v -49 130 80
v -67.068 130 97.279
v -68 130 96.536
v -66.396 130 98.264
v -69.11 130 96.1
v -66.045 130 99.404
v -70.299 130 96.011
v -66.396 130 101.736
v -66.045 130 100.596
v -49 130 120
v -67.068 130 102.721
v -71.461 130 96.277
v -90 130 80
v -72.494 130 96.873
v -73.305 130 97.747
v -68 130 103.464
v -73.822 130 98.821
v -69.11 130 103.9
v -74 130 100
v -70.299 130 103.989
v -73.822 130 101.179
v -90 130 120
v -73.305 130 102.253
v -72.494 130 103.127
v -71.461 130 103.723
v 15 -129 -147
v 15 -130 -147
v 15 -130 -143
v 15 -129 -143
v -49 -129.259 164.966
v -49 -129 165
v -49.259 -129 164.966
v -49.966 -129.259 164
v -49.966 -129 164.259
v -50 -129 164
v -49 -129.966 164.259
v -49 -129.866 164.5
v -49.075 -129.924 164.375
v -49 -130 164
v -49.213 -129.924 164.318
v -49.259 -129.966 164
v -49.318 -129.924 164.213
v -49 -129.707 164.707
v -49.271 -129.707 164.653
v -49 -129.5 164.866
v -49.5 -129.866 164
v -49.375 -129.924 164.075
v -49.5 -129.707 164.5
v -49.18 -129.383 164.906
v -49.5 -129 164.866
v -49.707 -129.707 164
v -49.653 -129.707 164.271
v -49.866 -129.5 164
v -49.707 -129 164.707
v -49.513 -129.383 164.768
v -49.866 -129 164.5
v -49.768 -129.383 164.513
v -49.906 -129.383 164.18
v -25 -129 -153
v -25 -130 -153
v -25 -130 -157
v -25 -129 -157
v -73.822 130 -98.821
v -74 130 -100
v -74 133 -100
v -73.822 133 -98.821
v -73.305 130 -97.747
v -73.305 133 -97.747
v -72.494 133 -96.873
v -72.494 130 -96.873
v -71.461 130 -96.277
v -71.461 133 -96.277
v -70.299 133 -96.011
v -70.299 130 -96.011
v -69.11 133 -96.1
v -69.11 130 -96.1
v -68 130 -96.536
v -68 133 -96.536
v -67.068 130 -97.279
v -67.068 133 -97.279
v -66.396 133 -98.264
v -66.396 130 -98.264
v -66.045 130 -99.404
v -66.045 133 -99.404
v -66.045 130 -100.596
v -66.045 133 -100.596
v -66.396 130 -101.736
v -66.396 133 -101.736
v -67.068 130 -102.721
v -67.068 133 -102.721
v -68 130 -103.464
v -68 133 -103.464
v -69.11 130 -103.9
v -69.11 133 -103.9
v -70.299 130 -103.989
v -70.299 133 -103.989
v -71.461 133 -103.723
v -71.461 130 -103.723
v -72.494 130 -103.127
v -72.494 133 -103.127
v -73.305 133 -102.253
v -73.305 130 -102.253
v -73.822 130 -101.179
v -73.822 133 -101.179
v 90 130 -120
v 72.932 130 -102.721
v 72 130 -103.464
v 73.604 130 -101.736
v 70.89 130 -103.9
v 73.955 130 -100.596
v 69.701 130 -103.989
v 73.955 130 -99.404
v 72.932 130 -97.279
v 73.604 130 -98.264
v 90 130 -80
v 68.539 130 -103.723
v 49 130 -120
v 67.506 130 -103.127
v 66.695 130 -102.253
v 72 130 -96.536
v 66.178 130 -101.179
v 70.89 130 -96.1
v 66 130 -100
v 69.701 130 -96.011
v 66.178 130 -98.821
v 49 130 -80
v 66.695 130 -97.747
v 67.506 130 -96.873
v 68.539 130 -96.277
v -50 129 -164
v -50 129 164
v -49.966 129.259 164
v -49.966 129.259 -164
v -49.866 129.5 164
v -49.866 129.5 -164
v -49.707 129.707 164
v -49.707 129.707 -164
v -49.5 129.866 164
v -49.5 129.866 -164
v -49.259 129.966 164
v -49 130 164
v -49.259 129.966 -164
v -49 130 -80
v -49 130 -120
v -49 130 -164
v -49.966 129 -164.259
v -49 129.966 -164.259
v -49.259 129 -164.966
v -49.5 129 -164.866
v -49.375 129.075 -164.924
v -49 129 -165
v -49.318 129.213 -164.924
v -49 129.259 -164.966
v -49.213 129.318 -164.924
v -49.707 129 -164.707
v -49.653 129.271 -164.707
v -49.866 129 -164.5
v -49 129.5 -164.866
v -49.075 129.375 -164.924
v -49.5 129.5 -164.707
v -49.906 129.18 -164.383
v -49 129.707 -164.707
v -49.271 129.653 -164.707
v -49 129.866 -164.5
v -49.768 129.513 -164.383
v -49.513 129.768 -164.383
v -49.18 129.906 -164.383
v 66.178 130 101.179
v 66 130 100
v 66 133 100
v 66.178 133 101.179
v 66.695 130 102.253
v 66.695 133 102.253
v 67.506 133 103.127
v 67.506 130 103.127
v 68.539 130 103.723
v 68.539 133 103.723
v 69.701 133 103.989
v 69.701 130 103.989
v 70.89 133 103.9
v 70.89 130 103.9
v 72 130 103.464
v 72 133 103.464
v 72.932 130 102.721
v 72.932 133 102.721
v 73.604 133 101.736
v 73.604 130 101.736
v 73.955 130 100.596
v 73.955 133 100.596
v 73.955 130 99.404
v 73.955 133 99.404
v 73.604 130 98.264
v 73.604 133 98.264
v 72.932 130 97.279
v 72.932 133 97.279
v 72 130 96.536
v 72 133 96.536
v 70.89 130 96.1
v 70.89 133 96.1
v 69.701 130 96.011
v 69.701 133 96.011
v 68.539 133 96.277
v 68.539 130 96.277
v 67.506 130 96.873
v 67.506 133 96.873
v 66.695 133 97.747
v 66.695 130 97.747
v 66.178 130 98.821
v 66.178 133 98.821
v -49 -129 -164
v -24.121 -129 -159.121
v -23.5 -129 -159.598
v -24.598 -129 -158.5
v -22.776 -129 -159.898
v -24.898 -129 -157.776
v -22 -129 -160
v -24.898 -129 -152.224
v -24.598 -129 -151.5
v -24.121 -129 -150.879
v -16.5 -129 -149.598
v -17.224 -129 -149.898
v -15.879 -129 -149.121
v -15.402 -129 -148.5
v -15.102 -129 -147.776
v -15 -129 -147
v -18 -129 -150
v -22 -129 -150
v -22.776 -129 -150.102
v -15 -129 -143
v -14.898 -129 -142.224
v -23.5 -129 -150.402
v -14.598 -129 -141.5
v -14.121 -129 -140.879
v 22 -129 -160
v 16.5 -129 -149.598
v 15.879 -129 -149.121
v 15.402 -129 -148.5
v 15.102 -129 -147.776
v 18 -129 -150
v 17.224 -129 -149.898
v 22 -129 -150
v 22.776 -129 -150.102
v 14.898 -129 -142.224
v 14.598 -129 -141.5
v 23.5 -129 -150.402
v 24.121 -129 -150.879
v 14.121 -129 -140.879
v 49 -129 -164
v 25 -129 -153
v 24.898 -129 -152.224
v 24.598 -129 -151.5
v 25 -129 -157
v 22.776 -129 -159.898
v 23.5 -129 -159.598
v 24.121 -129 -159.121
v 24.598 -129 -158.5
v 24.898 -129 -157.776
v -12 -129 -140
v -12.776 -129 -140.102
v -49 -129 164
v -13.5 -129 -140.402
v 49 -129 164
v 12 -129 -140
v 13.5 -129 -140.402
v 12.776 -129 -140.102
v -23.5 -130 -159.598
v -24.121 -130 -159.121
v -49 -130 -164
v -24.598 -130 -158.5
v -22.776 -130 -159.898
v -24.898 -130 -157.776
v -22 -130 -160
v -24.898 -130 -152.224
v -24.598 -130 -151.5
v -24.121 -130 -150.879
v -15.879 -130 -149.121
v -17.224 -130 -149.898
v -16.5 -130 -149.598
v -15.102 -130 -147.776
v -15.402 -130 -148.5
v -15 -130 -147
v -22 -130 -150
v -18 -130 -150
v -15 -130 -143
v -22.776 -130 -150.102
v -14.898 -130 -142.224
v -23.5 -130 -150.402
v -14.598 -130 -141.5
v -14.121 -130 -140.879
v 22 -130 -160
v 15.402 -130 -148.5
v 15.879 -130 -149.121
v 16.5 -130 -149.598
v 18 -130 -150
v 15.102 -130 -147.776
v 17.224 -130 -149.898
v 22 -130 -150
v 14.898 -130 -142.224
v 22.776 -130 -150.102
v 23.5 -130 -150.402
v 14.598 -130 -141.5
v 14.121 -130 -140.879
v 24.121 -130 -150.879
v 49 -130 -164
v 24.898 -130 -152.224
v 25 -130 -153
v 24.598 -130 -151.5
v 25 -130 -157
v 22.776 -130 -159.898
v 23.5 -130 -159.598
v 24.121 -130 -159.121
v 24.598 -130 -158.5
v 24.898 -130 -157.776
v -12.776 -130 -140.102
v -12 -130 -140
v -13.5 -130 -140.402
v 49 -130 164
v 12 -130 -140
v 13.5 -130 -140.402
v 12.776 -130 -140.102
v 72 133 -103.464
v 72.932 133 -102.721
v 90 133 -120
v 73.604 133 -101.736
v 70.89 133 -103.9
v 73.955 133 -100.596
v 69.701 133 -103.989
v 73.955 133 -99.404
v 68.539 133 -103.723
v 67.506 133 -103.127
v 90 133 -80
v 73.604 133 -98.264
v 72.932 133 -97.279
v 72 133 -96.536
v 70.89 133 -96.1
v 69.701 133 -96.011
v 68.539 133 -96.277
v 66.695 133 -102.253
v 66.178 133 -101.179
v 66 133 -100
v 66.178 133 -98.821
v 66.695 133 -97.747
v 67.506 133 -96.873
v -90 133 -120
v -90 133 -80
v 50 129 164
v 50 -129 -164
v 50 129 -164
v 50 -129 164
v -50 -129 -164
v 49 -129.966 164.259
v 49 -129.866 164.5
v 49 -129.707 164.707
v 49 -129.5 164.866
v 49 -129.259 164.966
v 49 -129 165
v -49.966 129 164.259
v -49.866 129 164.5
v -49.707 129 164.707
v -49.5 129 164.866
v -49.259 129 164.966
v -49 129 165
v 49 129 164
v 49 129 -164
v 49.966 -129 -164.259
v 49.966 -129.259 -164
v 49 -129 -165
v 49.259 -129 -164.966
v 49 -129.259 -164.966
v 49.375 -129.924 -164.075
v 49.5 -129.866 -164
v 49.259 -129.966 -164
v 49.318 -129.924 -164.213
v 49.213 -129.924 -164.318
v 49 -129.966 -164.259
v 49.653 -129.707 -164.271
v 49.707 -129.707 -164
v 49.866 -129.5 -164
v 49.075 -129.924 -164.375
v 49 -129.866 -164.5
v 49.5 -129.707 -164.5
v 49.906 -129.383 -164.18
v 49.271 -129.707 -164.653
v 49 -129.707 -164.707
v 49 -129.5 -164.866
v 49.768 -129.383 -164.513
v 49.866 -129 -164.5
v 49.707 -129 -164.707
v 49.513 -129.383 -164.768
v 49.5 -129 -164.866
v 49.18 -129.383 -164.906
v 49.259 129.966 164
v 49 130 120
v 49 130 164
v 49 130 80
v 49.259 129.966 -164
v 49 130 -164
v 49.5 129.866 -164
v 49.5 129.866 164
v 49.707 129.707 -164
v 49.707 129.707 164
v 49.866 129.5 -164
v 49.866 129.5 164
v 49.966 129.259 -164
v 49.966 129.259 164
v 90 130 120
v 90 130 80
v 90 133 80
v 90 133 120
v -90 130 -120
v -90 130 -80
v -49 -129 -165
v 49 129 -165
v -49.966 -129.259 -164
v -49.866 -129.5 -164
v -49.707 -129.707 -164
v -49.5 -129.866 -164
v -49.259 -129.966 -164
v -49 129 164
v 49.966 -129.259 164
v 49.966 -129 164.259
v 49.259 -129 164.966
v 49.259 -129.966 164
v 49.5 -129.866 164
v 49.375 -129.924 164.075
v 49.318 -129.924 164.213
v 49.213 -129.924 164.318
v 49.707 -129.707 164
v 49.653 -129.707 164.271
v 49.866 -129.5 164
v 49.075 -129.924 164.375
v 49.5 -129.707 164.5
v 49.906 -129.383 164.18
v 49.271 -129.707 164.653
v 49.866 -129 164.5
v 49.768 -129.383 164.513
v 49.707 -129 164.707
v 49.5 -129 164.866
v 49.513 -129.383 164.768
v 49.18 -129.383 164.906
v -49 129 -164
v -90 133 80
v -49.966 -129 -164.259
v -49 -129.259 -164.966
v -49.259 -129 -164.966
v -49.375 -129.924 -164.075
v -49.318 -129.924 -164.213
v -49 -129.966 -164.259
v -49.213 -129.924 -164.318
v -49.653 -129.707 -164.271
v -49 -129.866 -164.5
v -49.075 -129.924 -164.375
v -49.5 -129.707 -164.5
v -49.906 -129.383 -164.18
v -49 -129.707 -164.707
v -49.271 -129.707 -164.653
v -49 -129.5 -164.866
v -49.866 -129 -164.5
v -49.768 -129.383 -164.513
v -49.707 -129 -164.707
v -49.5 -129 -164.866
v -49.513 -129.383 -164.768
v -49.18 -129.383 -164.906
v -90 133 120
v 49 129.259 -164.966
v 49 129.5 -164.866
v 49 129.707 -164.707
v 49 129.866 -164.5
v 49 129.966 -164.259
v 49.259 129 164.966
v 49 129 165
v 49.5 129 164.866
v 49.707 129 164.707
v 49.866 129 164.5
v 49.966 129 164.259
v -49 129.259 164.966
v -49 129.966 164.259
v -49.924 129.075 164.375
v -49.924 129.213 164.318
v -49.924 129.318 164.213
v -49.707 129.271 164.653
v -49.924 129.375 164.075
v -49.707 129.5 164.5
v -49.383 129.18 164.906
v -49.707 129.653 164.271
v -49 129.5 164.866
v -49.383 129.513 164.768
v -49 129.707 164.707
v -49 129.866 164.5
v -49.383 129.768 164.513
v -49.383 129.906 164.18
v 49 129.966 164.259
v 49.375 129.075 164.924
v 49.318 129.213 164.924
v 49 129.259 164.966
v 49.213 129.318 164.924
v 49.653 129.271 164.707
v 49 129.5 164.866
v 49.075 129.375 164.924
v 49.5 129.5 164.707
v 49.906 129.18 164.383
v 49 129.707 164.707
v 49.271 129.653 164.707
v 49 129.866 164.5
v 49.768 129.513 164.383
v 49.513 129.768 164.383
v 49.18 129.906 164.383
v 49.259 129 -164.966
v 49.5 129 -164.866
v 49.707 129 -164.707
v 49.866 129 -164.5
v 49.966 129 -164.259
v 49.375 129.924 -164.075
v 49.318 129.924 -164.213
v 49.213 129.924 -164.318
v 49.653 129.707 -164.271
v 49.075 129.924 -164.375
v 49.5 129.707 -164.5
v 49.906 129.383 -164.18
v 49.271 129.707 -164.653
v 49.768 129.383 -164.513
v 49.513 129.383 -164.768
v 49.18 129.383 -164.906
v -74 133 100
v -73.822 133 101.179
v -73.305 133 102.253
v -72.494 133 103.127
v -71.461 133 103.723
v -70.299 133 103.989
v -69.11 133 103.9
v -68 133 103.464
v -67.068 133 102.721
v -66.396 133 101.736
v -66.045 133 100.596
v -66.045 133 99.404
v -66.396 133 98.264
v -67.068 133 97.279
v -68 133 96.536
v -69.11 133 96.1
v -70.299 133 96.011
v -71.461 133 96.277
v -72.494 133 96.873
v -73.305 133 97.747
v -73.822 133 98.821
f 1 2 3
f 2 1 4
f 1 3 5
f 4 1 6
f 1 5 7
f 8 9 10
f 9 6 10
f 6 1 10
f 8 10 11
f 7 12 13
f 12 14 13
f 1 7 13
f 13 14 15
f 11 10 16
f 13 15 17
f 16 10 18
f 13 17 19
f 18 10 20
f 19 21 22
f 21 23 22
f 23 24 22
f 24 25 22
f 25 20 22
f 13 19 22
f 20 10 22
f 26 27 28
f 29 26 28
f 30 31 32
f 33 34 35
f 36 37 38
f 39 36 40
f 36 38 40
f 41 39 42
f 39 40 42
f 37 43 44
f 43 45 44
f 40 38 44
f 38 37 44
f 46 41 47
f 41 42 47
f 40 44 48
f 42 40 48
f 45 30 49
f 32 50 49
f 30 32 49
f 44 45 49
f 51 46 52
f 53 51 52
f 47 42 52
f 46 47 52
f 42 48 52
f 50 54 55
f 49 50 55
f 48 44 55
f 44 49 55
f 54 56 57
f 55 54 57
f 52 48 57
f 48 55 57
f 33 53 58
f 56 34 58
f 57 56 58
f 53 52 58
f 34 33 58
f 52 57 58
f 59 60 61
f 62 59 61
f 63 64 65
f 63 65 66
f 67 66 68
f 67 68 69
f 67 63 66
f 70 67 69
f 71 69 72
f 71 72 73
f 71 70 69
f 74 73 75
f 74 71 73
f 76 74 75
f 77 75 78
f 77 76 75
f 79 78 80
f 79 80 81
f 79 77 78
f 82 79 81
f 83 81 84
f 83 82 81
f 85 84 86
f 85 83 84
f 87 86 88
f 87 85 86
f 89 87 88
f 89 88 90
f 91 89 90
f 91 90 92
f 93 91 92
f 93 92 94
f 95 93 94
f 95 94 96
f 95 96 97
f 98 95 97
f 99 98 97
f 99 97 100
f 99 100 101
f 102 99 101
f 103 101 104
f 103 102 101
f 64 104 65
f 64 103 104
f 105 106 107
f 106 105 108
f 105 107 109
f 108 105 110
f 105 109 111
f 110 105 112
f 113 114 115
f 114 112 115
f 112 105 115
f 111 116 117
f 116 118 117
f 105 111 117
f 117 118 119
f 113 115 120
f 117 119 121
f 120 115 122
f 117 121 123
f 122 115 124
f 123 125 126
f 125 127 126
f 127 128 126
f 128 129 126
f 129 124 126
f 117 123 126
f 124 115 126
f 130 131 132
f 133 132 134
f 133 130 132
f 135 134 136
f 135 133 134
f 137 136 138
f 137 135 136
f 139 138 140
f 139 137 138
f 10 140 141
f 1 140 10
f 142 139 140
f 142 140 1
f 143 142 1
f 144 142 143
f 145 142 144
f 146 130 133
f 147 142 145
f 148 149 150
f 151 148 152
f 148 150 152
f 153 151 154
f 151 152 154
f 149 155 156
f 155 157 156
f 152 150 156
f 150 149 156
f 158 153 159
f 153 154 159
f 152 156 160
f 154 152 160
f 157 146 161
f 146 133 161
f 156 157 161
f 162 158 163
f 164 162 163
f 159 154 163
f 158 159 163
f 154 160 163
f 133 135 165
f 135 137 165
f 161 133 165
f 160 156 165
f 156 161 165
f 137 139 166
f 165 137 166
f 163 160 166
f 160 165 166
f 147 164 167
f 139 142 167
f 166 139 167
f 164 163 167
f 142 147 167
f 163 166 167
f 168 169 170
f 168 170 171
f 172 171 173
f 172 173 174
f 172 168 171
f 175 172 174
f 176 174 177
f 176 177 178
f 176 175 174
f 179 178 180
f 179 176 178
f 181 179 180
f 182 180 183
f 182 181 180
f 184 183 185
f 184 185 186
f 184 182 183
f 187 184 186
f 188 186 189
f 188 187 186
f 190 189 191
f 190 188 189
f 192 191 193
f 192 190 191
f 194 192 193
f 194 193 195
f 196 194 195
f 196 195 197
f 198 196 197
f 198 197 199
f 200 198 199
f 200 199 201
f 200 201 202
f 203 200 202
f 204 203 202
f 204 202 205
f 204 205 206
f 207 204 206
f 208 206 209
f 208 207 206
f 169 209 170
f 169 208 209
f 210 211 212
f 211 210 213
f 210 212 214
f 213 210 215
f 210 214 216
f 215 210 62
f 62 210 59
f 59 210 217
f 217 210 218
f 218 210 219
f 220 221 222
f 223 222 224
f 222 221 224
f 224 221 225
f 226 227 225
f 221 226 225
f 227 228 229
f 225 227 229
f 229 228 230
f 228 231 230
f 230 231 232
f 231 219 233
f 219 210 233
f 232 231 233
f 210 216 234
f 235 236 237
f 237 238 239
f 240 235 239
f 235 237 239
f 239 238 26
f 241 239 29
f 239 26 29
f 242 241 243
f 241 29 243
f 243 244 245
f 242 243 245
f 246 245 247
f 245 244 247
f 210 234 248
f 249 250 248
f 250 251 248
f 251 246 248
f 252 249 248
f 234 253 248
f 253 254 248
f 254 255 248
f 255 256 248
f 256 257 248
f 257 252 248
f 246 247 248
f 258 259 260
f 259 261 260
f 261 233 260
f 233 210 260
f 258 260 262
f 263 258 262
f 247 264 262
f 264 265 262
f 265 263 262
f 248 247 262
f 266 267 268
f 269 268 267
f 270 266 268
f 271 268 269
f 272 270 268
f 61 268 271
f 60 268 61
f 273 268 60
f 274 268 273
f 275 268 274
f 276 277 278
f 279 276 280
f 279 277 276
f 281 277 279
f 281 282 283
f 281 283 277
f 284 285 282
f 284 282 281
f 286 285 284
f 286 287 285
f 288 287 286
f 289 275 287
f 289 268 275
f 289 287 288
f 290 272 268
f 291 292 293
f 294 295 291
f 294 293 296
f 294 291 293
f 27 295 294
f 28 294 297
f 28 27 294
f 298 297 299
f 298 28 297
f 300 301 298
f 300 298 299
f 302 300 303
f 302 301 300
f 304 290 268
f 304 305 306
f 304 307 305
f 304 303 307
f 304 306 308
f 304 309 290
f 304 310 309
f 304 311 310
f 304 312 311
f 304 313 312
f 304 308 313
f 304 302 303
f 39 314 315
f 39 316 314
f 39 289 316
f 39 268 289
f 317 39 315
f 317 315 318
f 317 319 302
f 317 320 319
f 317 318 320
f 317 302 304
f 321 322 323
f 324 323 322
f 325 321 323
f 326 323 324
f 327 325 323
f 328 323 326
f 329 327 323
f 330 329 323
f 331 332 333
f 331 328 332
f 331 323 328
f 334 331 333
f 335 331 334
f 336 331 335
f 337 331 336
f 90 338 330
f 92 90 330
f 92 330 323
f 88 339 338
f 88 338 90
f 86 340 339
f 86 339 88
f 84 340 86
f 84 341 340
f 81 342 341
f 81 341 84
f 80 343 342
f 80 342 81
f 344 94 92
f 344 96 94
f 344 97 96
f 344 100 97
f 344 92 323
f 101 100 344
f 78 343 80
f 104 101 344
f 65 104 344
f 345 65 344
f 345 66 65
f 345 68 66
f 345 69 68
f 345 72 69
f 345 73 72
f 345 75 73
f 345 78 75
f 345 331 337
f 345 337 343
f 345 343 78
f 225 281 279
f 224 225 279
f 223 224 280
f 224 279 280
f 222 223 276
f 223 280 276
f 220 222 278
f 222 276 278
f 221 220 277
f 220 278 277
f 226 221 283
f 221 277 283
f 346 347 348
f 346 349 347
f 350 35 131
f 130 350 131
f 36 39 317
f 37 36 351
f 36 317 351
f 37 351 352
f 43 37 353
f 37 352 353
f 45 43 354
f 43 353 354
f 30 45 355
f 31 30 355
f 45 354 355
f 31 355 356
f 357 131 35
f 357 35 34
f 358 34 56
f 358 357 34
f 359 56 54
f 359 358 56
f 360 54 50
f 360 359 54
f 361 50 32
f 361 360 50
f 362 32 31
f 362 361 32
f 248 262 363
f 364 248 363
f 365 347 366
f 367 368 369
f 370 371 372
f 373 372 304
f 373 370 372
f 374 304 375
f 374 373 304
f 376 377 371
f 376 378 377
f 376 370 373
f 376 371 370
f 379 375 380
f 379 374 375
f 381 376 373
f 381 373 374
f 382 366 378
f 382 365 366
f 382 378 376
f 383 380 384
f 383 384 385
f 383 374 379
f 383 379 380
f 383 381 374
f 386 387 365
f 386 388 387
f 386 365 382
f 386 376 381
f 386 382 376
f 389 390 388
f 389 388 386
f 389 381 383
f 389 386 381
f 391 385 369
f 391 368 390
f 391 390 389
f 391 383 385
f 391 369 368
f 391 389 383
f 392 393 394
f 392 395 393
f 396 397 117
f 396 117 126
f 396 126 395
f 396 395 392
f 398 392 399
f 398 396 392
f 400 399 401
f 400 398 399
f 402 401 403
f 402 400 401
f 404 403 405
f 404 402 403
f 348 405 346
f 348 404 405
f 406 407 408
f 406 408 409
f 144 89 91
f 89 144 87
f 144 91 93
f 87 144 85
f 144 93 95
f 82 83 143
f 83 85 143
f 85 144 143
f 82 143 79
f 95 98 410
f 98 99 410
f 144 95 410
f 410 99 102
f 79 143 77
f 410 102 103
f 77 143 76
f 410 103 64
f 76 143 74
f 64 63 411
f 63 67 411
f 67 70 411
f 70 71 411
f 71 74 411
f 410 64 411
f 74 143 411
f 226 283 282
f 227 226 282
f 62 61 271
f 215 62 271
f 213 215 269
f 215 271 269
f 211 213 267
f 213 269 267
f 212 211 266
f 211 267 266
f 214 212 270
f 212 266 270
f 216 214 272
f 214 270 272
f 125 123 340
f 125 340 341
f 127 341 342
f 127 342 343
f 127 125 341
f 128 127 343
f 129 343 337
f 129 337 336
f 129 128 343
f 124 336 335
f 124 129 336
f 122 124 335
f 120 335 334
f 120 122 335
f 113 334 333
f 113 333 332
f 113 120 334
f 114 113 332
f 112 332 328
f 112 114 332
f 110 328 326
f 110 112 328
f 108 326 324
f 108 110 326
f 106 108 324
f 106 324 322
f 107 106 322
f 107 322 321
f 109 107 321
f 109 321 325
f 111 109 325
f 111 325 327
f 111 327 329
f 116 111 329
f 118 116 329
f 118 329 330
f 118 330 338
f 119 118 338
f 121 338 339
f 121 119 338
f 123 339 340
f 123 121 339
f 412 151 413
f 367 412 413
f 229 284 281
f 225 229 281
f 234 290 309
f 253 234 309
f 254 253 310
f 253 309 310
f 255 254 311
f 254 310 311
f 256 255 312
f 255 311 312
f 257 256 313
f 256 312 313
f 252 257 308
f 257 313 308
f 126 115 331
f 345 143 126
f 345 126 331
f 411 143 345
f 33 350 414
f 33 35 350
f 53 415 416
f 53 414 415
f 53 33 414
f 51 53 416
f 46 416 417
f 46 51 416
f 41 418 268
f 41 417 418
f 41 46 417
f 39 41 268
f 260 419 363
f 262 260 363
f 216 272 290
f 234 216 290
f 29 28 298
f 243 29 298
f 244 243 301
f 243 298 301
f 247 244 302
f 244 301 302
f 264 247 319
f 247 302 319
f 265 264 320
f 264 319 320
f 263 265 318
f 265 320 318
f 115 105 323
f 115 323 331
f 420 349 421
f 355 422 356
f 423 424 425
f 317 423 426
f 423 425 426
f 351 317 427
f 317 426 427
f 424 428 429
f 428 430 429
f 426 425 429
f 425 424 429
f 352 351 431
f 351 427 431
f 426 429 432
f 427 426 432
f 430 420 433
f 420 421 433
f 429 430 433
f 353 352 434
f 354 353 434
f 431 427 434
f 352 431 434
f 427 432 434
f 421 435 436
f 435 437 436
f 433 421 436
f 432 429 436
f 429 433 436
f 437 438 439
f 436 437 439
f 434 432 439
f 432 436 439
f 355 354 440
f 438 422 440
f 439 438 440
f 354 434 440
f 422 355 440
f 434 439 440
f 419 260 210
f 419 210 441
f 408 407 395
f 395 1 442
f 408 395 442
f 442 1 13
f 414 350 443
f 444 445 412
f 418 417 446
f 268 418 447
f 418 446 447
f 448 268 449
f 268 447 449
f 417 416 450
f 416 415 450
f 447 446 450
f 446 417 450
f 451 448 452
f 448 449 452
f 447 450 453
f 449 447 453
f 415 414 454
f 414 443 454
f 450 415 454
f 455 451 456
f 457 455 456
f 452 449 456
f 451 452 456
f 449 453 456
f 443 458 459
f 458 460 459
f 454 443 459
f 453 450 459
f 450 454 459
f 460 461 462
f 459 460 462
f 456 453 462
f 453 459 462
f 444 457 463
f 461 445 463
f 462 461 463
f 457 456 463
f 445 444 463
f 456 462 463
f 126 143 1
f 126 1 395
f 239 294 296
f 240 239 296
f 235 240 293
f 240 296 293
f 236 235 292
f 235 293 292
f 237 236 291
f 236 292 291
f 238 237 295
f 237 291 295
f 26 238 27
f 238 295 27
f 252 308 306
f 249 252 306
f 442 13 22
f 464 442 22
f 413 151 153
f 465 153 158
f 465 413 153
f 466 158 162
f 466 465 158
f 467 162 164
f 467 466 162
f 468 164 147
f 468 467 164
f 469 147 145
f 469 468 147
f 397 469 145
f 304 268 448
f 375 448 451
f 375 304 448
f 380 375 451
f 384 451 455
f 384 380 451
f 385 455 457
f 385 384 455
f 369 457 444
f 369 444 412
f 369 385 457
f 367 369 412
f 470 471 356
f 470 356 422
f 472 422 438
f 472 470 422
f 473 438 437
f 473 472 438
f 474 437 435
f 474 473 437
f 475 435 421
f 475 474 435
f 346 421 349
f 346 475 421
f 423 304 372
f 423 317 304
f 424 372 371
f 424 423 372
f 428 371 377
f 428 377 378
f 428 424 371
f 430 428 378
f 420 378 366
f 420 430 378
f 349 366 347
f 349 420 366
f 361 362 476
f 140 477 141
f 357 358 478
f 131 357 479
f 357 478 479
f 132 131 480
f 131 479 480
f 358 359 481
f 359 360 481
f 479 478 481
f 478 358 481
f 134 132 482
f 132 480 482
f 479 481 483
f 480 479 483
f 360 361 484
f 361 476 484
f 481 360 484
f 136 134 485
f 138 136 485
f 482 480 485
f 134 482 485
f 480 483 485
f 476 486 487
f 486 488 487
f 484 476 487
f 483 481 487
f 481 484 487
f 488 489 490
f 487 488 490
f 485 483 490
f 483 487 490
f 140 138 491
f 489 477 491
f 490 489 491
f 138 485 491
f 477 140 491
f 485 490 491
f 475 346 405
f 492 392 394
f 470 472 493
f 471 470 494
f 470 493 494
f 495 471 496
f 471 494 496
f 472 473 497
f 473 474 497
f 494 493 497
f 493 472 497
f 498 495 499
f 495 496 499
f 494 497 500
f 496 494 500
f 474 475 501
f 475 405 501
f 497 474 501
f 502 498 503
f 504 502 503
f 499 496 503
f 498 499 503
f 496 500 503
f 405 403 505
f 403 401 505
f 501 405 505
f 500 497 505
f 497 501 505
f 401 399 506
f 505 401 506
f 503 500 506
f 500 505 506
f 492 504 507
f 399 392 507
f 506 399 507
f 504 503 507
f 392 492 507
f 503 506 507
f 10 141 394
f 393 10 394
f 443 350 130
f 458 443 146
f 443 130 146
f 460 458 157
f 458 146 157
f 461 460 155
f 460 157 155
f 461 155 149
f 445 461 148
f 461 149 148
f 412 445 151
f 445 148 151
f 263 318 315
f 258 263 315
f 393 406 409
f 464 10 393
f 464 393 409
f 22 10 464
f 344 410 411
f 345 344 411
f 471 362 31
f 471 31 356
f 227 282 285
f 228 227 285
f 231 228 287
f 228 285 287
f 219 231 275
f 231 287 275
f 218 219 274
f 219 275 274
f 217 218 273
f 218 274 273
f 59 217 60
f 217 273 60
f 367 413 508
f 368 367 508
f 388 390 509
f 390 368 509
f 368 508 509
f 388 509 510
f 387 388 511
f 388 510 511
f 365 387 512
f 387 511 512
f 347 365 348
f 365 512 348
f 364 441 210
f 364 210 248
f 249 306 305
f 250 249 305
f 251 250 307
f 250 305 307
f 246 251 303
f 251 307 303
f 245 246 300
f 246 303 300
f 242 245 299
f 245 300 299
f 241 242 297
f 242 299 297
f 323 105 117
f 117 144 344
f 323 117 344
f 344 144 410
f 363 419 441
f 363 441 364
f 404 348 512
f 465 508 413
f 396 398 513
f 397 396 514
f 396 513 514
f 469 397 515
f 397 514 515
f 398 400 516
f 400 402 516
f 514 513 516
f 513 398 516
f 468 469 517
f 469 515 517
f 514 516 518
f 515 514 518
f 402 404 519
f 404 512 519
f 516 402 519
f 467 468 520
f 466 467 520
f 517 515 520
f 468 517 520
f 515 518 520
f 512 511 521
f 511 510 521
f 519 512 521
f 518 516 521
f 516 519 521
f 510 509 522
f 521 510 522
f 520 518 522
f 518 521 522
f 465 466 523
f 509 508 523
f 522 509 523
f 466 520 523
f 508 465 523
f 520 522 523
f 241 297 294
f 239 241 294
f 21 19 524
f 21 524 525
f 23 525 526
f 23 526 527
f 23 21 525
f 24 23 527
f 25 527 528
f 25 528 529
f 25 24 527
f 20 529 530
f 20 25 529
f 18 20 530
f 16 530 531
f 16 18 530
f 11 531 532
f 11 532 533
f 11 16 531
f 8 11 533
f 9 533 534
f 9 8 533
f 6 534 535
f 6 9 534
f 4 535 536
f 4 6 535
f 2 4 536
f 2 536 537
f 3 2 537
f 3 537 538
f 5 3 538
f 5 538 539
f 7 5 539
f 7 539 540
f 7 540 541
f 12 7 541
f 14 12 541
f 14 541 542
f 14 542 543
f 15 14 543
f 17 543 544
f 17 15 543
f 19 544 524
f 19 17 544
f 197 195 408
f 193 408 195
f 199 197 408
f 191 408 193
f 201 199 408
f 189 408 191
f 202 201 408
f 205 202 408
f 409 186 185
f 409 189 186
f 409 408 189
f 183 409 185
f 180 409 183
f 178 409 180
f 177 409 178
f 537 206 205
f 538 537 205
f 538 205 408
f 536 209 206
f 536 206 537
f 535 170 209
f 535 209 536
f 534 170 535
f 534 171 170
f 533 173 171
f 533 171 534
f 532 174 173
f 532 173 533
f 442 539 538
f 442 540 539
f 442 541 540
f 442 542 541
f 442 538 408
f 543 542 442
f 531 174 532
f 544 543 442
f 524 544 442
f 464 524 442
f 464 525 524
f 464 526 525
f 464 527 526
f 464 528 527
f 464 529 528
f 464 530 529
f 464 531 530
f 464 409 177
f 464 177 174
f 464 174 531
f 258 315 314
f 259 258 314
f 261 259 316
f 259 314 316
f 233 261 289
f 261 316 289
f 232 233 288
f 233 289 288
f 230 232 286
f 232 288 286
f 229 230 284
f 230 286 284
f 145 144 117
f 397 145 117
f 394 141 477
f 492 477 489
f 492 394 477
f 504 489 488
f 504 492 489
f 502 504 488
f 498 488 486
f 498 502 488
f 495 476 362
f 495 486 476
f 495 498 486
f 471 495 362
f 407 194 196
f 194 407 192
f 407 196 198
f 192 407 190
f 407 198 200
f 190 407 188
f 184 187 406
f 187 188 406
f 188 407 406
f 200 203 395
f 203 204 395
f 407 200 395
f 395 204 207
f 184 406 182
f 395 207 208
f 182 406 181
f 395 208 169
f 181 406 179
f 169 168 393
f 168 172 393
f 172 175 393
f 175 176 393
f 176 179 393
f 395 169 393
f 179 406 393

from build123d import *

# Parameters (mm, degrees)
F0_W     = 100
F0_H     = 260
F1_DEPTH = 165
F2_T     = -1
F4_DEPTH = 220
F5_R     = 1
F6_W     = 180
F6_H     = 40
F6_R     = 4
F7_DEPTH = 3


with BuildPart() as f1:
    # F0 (on Top) → F1 (new body, symmetric)
    with BuildSketch(Plane.XY):
        Rectangle(F0_W, F0_H)
    extrude(amount=F1_DEPTH, both=True)

    # F2 (hollow: no face is removed)
    offset(amount=F2_T, mode=Mode.SUBTRACT)

    # F3 (on face) → F4 (cut, symmetric)
    with BuildSketch(Plane.XZ.offset(130)):
        with BuildLine():
            Line((-18, -150), (-22, -150))
            ThreePointArc((-22, -150), (-24.1213203436, -150.8786796564), (-25, -153))
            Line((-25, -153), (-25, -157))
            ThreePointArc((-25, -157), (-24.1213203436, -159.1213203436), (-22, -160))
            Line((-22, -160), (22, -160))
            ThreePointArc((22, -160), (24.1213203436, -159.1213203436), (25, -157))
            Line((25, -157), (25, -153))
            ThreePointArc((25, -153), (24.1213203436, -150.8786796564), (22, -150))
            Line((22, -150), (18, -150))
            ThreePointArc((18, -150), (15.8786796564, -149.1213203436), (15, -147))
            Line((15, -147), (15, -143))
            ThreePointArc((15, -143), (14.1213203436, -140.8786796564), (12, -140))
            Line((12, -140), (-12, -140))
            ThreePointArc((-12, -140), (-14.1213203436, -140.8786796564), (-15, -143))
            Line((-15, -143), (-15, -147))
            ThreePointArc((-15, -147), (-15.8786796564, -149.1213203436), (-18, -150))
        make_face()
    extrude(amount=F4_DEPTH, both=True, mode=Mode.SUBTRACT)

    # F5
    f5_edges = [f1.edges().sort_by_distance(p)[0] for p in [
        (50, 0, -165),
        (50, 130, 0),
        (50, 0, 165),
        (50, -130, 0),
        (0, 130, 165),
        (-50, 0, 165),
        (0, -130, 165),
        (-50, 130, 0),
        (-50, 0, -165),
        (-50, -130, 0),
        (0, 130, -165),
        (0, -130, -165),
    ]]
    fillet(f5_edges, radius=F5_R)

    # F6 (on face) → F7 (join)
    with BuildSketch(Plane(origin=(0, 130, 0), x_dir=(-1, 0, 0), z_dir=(0, 1, 0))):
        with Locations((0, 100)):
            Rectangle(F6_W, F6_H)
        with Locations((-70, 100)):
            Circle(F6_R, mode=Mode.SUBTRACT)
        with Locations((70, 100)):
            Circle(F6_R, mode=Mode.SUBTRACT)
        with Locations((0, -100)):
            Rectangle(F6_W, F6_H)
        with Locations((-70, -100)):
            Circle(F6_R, mode=Mode.SUBTRACT)
        with Locations((70, -100)):
            Circle(F6_R, mode=Mode.SUBTRACT)
    extrude(amount=F7_DEPTH)


solid = f1.part
